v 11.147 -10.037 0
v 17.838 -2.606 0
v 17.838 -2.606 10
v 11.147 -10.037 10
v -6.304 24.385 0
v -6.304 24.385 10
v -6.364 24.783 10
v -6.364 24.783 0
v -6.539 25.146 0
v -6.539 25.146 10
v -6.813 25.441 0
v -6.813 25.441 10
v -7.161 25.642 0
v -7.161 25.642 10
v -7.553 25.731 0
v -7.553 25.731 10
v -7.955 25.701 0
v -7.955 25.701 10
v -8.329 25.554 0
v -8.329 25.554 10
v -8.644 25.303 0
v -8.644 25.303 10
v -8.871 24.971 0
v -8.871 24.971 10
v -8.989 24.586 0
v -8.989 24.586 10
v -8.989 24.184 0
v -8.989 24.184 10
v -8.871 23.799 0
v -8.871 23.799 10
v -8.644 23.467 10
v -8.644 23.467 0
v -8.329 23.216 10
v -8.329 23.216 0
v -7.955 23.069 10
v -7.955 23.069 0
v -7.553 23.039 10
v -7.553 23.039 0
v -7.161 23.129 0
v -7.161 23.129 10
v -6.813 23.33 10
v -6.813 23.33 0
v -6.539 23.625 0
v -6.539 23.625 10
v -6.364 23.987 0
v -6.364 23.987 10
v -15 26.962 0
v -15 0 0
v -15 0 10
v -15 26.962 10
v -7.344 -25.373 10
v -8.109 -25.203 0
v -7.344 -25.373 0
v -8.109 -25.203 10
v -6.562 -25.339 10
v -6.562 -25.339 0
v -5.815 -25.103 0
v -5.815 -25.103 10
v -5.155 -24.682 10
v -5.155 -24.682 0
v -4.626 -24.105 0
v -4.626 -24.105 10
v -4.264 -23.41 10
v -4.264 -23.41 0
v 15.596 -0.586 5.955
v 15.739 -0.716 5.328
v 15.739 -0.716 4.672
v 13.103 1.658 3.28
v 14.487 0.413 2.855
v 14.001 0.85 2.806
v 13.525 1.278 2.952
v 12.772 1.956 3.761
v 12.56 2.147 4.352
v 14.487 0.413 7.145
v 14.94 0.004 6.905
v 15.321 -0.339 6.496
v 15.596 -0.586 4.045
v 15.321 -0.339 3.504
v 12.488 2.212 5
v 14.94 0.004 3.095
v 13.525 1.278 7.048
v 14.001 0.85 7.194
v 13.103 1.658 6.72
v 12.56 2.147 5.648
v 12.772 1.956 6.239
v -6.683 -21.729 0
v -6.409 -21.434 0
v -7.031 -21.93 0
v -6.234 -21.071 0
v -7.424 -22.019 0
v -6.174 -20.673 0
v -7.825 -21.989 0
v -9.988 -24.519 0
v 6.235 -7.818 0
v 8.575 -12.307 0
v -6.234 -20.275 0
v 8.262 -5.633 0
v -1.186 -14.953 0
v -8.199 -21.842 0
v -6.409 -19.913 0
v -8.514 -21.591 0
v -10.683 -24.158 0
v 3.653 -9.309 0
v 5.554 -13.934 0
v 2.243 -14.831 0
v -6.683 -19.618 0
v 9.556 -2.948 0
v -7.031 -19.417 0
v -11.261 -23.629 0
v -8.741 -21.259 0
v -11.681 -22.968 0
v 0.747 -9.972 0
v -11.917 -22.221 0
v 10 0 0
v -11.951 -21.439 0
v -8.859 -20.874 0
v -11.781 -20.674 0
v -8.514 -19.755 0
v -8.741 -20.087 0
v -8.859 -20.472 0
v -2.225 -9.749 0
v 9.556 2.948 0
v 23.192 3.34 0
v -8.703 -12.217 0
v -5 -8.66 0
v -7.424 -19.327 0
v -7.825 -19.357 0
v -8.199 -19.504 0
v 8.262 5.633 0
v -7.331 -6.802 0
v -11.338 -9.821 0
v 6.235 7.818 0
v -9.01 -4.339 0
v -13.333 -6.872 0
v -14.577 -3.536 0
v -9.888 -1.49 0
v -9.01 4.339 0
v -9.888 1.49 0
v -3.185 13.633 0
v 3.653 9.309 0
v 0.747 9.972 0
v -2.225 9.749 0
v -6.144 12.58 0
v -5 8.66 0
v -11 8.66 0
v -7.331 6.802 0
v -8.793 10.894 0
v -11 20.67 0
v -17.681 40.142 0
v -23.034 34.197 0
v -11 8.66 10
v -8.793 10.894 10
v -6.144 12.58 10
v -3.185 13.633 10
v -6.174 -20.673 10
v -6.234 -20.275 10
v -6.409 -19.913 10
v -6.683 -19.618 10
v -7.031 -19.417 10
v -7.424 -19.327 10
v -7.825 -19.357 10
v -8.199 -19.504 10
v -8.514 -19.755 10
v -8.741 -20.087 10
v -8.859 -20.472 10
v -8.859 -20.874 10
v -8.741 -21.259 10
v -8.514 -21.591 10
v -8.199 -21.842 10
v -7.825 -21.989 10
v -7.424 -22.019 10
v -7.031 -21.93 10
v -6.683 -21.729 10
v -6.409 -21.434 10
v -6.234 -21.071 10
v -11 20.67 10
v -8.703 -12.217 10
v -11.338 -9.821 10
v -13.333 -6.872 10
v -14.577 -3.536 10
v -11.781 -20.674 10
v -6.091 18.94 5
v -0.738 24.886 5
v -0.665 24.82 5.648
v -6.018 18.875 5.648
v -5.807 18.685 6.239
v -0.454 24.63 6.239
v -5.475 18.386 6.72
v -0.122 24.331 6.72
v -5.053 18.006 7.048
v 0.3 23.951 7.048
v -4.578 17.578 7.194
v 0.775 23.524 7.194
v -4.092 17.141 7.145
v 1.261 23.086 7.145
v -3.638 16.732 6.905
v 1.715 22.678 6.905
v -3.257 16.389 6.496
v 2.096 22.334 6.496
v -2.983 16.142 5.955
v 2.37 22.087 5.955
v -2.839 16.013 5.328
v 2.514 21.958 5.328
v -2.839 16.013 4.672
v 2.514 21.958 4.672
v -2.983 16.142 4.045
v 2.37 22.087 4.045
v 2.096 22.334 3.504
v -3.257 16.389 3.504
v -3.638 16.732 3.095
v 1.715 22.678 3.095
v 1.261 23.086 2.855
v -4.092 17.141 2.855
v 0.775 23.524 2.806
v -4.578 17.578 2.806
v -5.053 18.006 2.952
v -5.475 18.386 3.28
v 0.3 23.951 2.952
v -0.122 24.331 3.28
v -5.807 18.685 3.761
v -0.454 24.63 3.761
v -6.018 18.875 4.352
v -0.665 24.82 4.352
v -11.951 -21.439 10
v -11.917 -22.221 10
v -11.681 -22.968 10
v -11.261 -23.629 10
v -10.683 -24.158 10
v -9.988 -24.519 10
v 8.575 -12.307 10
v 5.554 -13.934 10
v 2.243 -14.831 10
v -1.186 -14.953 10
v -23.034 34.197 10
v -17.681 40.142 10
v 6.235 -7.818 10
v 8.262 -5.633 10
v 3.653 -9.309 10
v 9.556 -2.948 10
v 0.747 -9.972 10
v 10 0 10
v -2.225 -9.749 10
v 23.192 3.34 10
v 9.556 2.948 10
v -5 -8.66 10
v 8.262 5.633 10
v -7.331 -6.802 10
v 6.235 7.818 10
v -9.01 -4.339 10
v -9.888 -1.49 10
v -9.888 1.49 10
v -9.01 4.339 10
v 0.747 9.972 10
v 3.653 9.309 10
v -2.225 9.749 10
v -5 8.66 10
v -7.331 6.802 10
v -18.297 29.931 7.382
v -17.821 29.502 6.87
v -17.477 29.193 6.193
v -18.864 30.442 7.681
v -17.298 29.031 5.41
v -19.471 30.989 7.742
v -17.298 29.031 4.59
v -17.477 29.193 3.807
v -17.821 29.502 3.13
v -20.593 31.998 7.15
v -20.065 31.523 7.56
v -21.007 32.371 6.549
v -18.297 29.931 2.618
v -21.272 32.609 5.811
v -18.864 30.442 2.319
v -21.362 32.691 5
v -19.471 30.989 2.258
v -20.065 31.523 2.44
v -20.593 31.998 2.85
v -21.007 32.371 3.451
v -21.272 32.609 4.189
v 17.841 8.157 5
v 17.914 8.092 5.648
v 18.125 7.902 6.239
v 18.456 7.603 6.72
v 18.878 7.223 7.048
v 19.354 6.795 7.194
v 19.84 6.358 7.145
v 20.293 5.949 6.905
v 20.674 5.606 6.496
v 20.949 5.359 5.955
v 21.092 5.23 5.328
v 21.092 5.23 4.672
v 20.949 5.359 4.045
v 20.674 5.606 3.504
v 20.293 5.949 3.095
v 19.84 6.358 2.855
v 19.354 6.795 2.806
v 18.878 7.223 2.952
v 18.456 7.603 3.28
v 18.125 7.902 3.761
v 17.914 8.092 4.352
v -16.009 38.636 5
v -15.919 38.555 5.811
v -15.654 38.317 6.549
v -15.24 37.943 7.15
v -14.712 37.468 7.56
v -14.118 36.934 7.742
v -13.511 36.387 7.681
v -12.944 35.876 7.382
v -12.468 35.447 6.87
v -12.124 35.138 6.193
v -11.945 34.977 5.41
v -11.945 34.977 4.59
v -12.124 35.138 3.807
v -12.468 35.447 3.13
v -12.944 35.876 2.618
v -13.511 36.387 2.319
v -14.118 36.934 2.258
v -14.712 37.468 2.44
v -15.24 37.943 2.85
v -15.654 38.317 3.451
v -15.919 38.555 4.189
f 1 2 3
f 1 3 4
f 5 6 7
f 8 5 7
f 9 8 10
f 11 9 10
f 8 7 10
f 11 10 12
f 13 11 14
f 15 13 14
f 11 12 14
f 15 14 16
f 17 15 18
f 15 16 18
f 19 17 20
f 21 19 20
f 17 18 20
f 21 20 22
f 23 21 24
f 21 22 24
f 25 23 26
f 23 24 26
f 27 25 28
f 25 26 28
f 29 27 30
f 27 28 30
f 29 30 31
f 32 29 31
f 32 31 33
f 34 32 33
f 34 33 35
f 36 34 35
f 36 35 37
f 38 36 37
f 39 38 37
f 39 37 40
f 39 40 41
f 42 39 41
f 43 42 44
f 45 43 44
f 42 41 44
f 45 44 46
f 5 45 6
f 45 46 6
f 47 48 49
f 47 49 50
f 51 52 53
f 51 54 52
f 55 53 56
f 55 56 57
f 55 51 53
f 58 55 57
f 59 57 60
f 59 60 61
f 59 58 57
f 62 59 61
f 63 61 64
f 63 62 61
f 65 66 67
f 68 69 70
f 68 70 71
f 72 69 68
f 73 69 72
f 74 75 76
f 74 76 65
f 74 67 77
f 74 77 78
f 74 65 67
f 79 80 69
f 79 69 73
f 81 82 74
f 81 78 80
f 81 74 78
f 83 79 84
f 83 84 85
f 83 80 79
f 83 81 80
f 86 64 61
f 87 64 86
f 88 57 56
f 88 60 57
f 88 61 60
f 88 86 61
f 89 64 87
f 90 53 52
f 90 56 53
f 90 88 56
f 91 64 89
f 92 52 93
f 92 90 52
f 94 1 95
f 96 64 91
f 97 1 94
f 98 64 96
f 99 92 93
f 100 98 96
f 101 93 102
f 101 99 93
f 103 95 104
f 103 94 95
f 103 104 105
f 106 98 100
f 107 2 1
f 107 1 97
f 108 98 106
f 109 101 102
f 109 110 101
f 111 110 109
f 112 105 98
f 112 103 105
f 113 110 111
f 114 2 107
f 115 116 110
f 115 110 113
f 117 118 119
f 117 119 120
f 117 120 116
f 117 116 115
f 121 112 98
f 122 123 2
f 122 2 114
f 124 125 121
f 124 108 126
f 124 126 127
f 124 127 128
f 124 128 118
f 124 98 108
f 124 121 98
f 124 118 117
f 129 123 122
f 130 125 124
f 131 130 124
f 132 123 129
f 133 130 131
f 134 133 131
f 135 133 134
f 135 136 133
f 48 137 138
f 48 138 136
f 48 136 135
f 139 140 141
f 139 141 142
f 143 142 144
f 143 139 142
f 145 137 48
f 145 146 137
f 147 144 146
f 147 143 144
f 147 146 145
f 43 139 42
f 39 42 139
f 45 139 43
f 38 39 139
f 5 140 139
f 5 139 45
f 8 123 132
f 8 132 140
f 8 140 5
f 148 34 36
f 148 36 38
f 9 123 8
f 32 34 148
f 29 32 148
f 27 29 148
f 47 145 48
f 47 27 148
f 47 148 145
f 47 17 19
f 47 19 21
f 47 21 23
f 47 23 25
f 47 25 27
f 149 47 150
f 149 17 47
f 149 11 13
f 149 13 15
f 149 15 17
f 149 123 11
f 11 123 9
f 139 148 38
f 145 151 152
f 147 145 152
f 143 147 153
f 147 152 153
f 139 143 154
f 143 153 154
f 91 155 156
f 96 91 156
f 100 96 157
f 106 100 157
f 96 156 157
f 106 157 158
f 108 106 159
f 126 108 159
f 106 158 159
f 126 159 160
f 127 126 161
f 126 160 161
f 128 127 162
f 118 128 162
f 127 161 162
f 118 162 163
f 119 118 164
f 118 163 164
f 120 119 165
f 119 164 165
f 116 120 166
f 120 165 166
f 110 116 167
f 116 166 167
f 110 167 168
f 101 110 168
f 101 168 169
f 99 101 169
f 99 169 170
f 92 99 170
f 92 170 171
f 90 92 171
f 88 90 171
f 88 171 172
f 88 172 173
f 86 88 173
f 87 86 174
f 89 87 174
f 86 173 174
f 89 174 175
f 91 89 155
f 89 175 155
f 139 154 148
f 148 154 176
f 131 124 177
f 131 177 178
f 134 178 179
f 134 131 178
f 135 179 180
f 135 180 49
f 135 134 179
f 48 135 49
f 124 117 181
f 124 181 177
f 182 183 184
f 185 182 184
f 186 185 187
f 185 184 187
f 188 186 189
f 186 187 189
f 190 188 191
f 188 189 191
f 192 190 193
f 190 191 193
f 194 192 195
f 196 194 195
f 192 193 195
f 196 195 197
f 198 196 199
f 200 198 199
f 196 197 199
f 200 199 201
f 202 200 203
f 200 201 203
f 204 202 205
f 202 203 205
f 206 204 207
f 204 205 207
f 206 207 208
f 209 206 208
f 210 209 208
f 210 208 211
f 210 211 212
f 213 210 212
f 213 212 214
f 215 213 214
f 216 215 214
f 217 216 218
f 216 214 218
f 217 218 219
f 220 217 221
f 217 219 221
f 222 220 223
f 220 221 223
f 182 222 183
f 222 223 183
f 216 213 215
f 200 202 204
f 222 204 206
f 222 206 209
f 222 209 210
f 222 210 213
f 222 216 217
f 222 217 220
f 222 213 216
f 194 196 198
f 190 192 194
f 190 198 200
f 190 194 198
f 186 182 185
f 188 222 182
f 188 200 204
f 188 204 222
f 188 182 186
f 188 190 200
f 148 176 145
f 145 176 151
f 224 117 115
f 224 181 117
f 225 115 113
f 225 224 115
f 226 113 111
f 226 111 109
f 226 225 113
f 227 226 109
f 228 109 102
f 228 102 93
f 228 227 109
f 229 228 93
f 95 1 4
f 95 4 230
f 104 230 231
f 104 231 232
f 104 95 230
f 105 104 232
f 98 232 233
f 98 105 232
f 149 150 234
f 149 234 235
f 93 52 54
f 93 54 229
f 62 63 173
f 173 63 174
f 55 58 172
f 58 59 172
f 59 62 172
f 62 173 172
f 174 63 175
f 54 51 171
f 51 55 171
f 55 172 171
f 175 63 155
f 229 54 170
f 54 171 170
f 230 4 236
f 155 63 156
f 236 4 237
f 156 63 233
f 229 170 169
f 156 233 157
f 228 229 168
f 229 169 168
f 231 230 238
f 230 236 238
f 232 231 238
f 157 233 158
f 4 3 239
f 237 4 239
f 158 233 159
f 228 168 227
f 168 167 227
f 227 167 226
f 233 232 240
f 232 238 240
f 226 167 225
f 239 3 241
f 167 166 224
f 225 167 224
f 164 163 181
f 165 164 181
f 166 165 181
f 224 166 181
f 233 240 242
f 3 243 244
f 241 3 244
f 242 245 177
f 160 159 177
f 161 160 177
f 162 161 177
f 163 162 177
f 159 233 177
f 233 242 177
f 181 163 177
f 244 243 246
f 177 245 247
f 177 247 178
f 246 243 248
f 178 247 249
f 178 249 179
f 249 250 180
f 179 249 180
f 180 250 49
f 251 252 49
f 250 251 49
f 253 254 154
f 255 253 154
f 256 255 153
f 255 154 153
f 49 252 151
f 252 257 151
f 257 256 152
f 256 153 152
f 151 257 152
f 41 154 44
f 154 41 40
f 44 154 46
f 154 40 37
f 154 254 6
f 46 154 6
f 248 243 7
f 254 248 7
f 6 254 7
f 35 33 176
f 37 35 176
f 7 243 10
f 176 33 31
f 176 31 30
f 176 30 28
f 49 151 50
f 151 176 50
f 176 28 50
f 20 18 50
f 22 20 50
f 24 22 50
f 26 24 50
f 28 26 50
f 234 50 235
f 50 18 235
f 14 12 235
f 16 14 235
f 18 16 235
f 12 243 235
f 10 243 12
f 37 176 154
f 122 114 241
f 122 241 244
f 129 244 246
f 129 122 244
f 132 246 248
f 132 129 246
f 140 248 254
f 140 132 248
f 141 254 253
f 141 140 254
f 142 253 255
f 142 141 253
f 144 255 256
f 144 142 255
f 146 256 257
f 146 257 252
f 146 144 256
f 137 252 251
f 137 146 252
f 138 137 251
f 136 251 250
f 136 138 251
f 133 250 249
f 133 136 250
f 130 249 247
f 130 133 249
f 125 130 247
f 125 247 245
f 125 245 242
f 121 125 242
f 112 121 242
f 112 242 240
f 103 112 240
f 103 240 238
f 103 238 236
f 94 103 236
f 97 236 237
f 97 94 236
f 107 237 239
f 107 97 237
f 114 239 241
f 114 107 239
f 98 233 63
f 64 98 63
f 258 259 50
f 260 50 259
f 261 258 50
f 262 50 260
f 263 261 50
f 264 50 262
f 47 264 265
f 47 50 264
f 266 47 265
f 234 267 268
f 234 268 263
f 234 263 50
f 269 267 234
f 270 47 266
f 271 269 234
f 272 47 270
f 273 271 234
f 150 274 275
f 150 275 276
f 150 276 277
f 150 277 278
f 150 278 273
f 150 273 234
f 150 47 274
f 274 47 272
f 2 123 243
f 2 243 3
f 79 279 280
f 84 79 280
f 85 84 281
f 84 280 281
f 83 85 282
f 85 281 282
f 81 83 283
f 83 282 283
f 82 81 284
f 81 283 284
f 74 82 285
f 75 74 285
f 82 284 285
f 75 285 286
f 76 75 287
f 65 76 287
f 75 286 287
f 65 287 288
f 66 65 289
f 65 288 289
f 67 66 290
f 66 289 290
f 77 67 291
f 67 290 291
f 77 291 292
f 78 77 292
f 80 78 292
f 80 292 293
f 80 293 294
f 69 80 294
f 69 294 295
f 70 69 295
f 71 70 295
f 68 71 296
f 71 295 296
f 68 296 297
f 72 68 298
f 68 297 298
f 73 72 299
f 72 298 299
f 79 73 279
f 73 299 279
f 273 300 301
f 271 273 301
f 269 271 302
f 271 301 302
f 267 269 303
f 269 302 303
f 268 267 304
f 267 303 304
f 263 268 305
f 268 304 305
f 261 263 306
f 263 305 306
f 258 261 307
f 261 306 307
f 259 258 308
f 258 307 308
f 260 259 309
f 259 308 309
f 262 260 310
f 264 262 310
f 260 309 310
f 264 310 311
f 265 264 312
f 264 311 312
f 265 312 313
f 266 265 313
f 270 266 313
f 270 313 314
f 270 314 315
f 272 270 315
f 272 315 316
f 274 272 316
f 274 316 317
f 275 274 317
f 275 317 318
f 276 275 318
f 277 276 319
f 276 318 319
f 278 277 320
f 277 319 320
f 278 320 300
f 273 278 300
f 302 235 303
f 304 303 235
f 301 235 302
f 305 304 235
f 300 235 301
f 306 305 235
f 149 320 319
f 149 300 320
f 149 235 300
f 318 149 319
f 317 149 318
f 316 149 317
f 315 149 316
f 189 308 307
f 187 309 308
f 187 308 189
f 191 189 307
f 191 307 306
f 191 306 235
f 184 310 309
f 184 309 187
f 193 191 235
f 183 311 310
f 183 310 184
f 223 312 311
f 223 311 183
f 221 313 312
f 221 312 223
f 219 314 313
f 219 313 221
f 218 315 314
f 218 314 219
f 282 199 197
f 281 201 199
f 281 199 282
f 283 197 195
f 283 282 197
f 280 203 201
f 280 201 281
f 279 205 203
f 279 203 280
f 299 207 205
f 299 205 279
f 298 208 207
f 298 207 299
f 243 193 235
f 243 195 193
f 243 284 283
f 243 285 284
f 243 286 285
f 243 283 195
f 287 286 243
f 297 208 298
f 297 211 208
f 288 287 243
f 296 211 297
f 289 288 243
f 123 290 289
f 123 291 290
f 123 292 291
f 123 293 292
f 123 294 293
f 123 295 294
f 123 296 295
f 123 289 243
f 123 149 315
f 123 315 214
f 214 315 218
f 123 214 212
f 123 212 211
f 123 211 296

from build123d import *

# Parameters (mm, degrees)
SKETCH1_R                  = 10
EXTRUDE_3_8_DEPTH          = 10
BOSS_EXTRUDE2_DEPTH        = 10
SKETCH3_R                  = 1.35
M3_DRILL_OR_THROUGH_DEPTH  = 10
FILLET1_R                  = 3
SKETCH4_R                  = 2.75
M5_THROUGH_DEPTH           = 8
SKETCH5_R                  = 2.2
M5_DRILL_DEPTH             = 8
CUT_EXTRUDE4_DEPTH         = 10
SKETCH7_R                  = 1.35
M3_DRILL_OR_THROUGH2_DEPTH = 10


with BuildPart() as part:
    # Sketch1 → 3/8 (new body)
    with BuildSketch(Plane.XY):
        with BuildLine():
            Line((-15, 0), (-15, 26.962387961))
            Line((-15, 26.962387961), (-23.034486956, 34.196672509))
            Line((-23.034486956, 34.196672509), (-17.681442105, 40.141831113))
            Line((-17.681442105, 40.141831113), (23.191523297, 3.339647763))
            Line((23.191523297, 3.339647763), (17.838478446, -2.605510841))
            Line((17.838478446, -2.605510841), (11.147172382, -10.036959095))
            ThreePointArc((11.147172382, -10.036959095), (-5.375519243, -14.003706397), (-15, 0))
        make_face()
        Circle(SKETCH1_R, mode=Mode.SUBTRACT)
    extrude(amount=EXTRUDE_3_8_DEPTH)

    # Sketch2 → Boss-Extrude2 (add)
    with BuildSketch(Plane.XY):
        Polygon((-8.703298337, -12.216898054), (-1.18575737, -14.953059201), (-5.28999909, -26.22937065), (-12.807540057, -23.493209503), align=None)
    extrude(amount=BOSS_EXTRUDE2_DEPTH)

    # Sketch3 → M3_DRILL_or_Through (cut)
    with BuildSketch(Plane.XY.offset(10)):
        with Locations((-7.524443153, -20.673237657)):
            Circle(SKETCH3_R)
    extrude(amount=-M3_DRILL_OR_THROUGH_DEPTH, mode=Mode.SUBTRACT)

    # Fillet1
    fillet1_edges = [part.edges().sort_by_distance(p)[0] for p in [
        (-12.807540057, -23.493209503, 5),
        (-5.28999909, -26.22937065, 5),
    ]]
    fillet(fillet1_edges, radius=FILLET1_R)

    # Sketch4 → M5_through (cut)
    with BuildSketch(Plane(origin=(12.044350914, 13.376606859, 0), x_dir=(0.7431448254773932, -0.6691306063588595, 0), z_dir=(0.6691306063588595, 0.7431448254773932, 0))):
        with Locations(Location((-35, -5, 0), (0, 0, 180))):
            Circle(SKETCH4_R)
    extrude(amount=-M5_THROUGH_DEPTH, mode=Mode.SUBTRACT)

    # Sketch5 → M5_DRILL (cut)
    with BuildSketch(Plane(origin=(12.044350914, 13.376606859, 0), x_dir=(0.7431448254773932, -0.6691306063588595, 0), z_dir=(0.6691306063588595, 0.7431448254773932, 0))):
        with Locations(Location((-15, -5, 0), (0, 0, 180))):
            Circle(SKETCH5_R)
        with Locations(Location((10, -5, 0), (0, 0, 180))):
            Circle(SKETCH5_R)
    extrude(amount=-M5_DRILL_DEPTH, mode=Mode.SUBTRACT)

    # Sketch6 → Cut-Extrude4 (cut)
    with BuildSketch(Plane.XY.offset(10)):
        with BuildLine():
            Line((-11, 20.669506324), (-11, 8.660254038))
            ThreePointArc((-11, 8.660254038), (-7.515689996, 11.81162156), (-3.18503916, 13.632883978))
            Line((-3.18503916, 13.632883978), (-11, 20.669506324))
        make_face()
    extrude(amount=-CUT_EXTRUDE4_DEPTH, mode=Mode.SUBTRACT)

    # Sketch7 → M3_DRILL_or_Through2 (cut)
    with BuildSketch(Plane.XY.offset(10)):
        with Locations((-7.654346968, 24.385230452)):
            Circle(SKETCH7_R)
    extrude(amount=-M3_DRILL_OR_THROUGH2_DEPTH, mode=Mode.SUBTRACT)


solid = part.part
